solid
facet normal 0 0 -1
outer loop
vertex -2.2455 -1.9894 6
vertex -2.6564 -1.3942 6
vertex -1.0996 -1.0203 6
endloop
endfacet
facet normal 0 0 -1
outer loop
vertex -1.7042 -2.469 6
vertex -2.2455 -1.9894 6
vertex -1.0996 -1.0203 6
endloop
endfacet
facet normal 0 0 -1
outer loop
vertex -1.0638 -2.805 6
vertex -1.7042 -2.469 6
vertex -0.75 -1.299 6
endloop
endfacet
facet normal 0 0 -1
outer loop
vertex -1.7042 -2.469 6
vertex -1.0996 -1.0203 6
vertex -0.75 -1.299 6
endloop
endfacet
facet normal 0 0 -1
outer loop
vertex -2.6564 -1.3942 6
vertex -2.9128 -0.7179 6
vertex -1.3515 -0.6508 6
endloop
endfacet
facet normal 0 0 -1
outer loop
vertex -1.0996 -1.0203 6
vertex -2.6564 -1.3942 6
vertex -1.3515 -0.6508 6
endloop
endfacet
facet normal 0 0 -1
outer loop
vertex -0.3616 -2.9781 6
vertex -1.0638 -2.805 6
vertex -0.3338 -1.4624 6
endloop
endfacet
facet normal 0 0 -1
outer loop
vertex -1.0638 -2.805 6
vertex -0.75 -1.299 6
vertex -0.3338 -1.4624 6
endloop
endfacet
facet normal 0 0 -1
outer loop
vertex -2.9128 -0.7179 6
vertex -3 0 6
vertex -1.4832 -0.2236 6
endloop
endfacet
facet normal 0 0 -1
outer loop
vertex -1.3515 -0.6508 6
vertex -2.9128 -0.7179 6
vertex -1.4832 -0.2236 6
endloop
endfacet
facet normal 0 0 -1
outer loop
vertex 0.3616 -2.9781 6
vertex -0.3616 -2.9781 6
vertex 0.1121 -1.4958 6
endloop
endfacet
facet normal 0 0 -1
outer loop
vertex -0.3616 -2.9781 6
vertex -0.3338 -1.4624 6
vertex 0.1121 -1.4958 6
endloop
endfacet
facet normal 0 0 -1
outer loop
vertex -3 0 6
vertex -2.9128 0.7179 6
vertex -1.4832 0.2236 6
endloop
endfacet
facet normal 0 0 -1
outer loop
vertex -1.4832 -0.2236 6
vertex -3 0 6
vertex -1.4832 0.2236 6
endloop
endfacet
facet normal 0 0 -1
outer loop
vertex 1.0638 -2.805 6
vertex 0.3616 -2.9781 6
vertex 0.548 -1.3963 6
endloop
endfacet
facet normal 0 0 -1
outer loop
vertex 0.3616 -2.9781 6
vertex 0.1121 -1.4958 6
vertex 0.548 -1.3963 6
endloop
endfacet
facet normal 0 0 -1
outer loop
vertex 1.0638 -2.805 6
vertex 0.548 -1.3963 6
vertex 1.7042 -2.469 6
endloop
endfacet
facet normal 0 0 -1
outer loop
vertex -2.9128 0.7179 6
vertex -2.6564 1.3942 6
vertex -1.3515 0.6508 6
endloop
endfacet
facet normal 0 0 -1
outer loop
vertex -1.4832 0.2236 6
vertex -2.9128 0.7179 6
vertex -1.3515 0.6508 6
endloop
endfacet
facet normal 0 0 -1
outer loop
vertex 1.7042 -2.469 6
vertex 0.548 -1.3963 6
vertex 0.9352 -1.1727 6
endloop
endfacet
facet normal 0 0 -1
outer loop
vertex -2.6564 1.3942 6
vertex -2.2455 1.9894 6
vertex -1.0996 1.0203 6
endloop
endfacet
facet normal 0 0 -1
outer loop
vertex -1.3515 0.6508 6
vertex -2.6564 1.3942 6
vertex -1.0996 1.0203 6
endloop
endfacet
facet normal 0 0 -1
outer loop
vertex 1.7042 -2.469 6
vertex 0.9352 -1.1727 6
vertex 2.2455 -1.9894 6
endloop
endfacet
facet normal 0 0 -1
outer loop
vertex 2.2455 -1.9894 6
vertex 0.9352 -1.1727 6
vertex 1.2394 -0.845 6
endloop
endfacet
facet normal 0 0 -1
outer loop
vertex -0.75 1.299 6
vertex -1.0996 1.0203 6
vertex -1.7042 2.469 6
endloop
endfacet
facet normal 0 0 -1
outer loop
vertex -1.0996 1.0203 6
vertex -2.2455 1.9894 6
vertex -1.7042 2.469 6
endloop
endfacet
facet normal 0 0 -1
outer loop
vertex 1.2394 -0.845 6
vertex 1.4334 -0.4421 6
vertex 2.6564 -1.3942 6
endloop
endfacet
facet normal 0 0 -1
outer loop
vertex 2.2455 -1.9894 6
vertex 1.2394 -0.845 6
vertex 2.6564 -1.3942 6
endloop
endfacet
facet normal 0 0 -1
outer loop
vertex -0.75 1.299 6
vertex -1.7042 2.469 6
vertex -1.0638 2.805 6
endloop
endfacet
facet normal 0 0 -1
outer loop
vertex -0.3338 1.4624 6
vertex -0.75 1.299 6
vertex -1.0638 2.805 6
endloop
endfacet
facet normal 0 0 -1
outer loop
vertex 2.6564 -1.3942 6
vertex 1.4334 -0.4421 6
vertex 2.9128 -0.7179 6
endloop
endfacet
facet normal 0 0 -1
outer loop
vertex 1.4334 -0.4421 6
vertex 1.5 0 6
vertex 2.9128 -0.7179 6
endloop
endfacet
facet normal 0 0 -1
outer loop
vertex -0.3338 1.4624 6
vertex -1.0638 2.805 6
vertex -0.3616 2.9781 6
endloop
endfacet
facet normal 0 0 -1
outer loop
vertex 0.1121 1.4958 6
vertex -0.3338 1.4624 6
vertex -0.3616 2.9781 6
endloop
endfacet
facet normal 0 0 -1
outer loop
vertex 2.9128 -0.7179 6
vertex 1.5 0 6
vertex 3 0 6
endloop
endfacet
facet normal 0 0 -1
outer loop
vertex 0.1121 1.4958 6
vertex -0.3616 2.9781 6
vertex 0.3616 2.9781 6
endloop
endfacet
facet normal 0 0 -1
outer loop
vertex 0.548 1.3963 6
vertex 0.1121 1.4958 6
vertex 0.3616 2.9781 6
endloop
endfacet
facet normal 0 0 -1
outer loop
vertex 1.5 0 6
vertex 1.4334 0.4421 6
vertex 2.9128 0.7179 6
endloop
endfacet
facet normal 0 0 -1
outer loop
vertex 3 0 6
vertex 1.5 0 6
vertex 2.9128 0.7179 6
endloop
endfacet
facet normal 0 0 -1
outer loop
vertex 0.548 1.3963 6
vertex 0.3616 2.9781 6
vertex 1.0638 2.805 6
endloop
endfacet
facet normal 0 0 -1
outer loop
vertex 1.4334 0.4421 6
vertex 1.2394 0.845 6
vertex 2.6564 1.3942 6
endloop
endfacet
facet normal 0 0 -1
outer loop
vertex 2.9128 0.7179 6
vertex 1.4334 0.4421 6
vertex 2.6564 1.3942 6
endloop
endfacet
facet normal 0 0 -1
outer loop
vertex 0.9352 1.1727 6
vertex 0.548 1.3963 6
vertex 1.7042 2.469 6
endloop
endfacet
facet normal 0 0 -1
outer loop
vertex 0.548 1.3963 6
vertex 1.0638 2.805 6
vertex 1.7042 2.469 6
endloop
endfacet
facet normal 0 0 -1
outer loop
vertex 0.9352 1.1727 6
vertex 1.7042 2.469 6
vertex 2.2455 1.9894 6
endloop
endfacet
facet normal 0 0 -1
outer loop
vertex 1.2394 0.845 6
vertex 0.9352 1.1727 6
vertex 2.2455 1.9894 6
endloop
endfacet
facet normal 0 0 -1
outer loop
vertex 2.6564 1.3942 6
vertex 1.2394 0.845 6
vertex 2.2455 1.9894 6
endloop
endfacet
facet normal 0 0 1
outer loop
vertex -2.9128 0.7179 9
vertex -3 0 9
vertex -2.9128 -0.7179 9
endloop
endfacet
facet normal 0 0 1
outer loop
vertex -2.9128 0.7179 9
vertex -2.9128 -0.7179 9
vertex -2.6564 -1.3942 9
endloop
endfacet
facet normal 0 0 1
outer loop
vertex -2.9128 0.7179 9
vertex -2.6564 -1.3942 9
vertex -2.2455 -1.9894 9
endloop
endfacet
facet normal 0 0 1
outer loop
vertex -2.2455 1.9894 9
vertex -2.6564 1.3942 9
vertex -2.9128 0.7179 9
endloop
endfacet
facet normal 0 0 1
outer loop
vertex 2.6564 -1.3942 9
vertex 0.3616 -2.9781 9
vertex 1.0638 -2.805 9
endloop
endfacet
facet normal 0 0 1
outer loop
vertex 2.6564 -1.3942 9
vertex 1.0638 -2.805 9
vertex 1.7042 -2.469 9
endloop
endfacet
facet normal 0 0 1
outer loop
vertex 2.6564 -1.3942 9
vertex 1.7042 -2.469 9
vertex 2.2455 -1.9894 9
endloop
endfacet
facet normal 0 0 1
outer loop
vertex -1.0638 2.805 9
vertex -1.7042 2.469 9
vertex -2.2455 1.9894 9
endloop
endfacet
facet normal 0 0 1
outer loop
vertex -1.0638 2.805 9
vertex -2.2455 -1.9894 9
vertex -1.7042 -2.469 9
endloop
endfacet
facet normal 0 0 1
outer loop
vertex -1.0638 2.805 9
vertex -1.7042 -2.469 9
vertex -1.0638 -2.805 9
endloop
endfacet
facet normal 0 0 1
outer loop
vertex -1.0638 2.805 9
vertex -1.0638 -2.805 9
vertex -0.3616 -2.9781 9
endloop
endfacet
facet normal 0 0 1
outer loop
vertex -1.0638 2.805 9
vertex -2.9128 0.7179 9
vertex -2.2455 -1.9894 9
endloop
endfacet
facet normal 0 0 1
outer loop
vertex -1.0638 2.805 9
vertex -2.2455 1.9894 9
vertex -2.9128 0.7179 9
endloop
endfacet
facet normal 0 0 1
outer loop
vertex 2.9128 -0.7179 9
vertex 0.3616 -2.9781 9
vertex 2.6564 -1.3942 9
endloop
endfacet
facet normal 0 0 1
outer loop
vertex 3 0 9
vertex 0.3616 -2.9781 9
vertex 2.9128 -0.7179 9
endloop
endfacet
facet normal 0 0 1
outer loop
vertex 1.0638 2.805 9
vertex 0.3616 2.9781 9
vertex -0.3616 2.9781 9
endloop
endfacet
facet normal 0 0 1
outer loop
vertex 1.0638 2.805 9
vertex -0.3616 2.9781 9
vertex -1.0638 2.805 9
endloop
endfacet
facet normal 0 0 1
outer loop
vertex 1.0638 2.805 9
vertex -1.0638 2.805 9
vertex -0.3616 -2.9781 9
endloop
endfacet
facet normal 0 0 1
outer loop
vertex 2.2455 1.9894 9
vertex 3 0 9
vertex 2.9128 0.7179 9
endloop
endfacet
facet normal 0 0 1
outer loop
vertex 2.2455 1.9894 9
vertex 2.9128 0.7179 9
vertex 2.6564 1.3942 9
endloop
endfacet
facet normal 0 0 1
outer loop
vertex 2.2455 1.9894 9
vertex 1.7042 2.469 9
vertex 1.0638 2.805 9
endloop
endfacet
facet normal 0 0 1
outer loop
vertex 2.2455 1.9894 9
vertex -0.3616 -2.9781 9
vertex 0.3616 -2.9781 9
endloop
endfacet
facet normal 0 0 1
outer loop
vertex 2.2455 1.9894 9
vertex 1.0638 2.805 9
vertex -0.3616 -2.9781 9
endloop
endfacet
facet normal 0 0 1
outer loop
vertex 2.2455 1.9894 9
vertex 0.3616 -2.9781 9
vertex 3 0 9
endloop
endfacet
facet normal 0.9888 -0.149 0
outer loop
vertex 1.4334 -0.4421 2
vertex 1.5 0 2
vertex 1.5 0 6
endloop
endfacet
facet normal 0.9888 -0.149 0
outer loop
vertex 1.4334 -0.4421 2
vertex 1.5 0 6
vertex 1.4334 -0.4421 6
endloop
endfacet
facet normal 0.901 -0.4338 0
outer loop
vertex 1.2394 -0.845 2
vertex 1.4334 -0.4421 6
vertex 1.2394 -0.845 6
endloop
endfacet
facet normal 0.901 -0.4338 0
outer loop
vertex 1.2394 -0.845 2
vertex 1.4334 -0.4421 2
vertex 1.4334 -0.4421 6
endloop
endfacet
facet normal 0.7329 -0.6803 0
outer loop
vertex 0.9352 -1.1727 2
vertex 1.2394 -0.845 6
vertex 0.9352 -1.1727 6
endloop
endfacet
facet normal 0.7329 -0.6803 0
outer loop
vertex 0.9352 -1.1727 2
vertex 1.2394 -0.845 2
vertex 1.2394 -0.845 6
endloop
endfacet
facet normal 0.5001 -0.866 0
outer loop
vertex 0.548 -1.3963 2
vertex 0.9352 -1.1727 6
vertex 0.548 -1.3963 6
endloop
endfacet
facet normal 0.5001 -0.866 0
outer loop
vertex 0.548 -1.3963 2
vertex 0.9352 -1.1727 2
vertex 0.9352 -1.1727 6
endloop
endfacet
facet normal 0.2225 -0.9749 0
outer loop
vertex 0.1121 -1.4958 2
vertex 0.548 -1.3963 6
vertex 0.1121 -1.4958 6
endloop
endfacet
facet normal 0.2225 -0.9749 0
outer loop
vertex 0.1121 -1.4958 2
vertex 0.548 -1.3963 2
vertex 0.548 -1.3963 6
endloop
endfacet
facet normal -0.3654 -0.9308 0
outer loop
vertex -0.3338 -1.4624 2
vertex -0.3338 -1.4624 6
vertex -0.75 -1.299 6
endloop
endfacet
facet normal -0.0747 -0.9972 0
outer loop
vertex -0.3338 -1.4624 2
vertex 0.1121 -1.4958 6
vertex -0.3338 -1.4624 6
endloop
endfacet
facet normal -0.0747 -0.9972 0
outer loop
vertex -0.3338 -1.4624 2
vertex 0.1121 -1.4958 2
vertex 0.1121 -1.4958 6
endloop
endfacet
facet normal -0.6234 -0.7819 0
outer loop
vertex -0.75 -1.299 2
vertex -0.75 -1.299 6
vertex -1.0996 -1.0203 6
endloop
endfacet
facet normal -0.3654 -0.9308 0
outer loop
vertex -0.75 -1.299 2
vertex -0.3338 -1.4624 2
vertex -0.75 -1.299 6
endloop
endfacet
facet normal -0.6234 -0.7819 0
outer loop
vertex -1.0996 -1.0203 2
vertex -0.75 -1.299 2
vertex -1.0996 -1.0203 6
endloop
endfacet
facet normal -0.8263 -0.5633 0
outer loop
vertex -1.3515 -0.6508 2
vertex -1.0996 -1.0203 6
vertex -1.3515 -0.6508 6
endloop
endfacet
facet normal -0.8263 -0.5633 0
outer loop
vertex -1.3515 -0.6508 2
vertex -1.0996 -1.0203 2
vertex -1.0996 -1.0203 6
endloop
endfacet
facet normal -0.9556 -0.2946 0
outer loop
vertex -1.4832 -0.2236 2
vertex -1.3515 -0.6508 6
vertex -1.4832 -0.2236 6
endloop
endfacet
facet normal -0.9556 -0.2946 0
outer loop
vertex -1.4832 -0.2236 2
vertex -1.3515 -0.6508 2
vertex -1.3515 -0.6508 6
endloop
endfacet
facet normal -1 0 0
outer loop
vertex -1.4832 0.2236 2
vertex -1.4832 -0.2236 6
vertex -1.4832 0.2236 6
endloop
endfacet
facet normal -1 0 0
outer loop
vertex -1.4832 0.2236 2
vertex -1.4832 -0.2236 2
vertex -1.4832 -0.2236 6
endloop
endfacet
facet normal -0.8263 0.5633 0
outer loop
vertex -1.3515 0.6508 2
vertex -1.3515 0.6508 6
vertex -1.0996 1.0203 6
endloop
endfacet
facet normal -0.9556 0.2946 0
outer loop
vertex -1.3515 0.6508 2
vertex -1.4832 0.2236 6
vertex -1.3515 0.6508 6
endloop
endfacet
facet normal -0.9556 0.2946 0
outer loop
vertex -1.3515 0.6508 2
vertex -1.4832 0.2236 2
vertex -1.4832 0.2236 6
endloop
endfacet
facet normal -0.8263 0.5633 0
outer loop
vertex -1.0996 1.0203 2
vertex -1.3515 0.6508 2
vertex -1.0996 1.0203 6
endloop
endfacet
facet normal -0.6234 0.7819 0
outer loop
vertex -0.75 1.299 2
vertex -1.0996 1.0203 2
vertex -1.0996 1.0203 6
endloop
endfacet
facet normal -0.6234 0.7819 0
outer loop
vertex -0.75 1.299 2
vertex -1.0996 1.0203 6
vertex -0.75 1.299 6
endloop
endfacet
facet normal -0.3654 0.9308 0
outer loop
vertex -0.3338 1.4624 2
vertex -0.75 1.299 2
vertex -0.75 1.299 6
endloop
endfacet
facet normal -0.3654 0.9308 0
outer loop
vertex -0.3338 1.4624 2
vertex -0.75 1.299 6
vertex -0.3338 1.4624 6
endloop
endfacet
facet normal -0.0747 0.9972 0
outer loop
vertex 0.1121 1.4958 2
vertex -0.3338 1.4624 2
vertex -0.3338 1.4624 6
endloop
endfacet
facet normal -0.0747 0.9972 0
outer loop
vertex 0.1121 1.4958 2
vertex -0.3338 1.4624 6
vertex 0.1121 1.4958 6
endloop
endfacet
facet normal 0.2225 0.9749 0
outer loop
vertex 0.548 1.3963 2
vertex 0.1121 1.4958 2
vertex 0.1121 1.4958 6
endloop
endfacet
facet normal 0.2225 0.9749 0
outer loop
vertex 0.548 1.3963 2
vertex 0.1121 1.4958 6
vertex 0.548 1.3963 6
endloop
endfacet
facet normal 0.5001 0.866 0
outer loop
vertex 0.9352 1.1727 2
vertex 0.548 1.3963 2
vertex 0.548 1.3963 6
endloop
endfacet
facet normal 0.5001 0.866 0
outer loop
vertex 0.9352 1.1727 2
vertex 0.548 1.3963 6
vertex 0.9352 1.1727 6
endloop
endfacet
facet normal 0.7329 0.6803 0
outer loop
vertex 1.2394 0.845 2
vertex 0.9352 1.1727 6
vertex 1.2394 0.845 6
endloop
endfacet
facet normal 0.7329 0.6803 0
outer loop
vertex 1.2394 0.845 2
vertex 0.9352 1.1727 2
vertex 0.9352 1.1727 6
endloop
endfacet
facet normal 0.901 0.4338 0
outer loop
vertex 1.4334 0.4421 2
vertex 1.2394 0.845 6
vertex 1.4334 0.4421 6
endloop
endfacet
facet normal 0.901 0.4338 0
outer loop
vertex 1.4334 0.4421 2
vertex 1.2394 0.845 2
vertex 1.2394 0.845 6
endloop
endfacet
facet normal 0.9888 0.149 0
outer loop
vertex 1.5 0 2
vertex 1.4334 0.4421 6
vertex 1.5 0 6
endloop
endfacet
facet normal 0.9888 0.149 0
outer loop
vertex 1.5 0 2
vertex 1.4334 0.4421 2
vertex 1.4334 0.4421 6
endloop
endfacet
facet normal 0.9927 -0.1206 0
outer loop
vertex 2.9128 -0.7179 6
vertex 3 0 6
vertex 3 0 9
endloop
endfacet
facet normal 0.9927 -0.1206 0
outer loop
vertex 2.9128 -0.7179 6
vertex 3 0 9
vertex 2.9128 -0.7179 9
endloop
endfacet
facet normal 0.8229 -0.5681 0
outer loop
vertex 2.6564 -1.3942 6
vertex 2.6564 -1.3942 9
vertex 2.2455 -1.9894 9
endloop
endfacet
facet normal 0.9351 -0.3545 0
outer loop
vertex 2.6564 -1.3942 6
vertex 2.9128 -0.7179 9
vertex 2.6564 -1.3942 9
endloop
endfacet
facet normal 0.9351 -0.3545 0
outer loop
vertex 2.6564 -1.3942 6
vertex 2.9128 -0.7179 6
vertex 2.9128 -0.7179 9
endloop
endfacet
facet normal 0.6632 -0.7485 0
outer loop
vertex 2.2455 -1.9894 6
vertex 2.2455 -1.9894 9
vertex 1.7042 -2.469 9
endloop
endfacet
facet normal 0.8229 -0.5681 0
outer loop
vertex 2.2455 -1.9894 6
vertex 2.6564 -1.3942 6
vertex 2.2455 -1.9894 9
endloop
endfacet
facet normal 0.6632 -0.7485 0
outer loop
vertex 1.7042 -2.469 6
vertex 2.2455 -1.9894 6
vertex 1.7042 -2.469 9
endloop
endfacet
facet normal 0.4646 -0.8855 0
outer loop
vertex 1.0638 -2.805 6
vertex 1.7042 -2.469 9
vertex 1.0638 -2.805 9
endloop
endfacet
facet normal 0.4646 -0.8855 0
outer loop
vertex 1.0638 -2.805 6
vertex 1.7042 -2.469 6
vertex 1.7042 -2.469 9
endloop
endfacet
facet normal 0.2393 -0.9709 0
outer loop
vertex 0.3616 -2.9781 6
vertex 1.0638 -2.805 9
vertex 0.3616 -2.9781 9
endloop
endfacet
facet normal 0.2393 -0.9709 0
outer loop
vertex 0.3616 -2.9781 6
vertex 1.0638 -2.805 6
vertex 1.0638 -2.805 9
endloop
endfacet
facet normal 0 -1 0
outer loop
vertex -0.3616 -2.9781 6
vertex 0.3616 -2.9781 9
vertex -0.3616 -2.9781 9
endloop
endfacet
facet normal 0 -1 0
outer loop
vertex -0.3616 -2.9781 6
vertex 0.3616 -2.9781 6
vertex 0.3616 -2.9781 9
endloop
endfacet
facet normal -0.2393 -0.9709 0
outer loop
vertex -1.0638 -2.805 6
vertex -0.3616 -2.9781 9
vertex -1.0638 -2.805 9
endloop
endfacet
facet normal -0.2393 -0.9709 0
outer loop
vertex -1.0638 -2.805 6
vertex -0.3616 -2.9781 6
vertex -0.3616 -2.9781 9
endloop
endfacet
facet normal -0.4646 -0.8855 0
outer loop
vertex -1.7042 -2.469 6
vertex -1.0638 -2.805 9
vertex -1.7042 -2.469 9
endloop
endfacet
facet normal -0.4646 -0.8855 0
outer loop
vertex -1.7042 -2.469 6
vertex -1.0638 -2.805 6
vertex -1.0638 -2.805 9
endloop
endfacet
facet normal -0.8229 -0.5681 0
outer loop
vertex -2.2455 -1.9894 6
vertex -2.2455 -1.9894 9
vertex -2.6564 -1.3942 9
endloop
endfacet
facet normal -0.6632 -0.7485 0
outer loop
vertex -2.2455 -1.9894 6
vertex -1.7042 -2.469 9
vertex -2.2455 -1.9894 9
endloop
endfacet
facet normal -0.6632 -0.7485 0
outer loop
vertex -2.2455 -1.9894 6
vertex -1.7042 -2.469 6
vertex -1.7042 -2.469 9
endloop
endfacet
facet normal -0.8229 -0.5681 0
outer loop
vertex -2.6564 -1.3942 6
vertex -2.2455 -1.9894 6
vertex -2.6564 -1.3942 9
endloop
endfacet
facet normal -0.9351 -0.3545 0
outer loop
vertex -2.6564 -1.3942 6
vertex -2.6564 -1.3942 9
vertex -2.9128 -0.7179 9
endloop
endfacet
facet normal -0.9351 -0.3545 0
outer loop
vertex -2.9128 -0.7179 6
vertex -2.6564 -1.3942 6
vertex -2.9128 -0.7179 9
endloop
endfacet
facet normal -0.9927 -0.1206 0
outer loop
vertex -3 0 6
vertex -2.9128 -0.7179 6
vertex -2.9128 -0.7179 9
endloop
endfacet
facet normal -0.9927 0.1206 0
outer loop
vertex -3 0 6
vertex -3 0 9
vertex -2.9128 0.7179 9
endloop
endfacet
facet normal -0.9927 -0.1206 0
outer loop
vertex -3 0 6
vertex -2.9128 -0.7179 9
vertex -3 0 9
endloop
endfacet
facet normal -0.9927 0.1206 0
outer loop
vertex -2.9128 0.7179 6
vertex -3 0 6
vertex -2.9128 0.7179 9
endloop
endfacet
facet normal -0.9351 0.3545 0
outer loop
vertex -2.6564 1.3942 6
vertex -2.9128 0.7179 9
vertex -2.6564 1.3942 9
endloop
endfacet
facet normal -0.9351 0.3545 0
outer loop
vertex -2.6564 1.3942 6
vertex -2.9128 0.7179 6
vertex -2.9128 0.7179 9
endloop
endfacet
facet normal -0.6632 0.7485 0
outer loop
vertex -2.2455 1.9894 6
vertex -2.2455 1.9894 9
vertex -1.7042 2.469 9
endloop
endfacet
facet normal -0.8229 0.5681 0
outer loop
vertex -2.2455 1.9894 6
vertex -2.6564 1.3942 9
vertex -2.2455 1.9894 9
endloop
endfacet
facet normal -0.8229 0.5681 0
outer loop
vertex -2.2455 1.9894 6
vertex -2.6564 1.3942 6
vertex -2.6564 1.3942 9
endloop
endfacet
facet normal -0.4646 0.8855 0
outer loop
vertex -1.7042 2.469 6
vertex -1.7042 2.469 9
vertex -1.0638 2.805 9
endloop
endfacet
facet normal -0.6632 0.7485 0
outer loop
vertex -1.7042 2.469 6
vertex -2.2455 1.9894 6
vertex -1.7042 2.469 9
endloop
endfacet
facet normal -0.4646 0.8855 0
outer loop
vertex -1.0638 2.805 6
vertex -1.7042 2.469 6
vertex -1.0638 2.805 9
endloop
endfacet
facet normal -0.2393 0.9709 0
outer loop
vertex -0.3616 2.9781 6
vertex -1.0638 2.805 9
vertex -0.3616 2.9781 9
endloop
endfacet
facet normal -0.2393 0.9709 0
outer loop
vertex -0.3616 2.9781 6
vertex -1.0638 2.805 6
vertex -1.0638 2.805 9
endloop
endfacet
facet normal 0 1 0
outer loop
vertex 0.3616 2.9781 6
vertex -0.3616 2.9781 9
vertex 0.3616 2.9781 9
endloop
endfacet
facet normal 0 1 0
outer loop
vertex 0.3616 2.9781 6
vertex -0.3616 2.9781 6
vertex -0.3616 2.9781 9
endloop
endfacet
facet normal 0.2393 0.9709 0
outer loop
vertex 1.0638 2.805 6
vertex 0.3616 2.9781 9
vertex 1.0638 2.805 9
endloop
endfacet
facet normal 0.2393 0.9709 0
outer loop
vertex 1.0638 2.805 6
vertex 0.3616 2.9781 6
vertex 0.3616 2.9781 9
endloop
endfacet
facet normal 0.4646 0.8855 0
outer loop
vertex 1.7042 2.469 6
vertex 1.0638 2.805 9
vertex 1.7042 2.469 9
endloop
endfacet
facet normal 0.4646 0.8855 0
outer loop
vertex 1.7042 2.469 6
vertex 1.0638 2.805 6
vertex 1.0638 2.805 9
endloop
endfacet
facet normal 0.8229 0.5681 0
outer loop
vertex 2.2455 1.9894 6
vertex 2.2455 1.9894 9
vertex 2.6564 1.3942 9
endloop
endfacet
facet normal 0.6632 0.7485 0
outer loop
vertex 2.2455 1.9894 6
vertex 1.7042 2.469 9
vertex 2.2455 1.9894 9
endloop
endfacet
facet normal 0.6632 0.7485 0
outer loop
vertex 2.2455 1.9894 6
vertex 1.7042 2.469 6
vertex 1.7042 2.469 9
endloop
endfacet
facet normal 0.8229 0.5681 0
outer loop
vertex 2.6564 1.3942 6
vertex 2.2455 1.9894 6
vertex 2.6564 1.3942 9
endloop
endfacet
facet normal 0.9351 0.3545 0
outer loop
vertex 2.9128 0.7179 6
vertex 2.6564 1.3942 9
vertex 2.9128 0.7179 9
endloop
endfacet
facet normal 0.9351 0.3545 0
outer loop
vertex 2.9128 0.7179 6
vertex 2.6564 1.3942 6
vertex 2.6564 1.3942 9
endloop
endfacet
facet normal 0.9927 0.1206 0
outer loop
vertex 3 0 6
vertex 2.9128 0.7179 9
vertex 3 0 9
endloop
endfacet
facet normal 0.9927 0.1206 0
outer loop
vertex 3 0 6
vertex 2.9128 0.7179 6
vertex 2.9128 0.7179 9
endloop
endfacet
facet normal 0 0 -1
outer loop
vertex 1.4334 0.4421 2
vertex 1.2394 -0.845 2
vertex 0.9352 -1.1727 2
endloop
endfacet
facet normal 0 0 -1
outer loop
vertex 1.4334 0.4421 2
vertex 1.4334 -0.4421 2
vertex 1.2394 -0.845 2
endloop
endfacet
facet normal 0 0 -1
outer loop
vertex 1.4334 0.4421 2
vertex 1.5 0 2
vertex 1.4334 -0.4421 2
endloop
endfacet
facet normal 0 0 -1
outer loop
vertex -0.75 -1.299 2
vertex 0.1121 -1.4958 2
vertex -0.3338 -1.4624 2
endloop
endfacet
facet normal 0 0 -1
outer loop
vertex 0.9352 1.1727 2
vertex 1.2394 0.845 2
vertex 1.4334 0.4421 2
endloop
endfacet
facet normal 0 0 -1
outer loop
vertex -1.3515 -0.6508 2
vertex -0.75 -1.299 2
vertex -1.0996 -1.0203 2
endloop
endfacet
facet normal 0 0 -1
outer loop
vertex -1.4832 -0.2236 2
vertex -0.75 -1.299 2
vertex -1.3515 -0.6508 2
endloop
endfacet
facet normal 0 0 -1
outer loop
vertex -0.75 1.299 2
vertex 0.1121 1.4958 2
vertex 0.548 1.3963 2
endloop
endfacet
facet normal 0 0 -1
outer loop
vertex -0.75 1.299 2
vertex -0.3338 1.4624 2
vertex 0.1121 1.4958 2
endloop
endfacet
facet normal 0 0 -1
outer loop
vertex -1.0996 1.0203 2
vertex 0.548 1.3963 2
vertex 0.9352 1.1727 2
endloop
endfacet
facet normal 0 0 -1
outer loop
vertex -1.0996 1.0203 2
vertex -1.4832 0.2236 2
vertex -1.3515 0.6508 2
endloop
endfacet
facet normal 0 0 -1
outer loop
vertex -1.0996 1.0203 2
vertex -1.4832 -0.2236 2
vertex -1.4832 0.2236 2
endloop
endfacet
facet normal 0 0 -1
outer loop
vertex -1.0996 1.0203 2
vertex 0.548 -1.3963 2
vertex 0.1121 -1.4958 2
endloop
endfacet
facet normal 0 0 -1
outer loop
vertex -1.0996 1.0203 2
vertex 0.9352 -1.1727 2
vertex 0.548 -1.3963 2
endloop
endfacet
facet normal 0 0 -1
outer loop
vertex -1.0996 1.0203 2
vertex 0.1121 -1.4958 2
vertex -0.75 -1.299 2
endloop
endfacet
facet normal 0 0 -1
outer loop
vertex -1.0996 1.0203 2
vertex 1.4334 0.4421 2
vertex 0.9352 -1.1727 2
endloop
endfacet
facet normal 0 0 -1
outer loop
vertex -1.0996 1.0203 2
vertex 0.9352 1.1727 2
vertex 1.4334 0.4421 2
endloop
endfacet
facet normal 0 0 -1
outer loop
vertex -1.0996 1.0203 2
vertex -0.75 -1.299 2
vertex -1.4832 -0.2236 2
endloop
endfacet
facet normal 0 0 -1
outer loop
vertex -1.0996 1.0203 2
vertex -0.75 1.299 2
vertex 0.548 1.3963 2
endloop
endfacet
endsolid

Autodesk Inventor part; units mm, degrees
ref_plane "YZ Plane" through (0, 0, 0) normal (1, 0, 0) x (0, 1, 0)
ref_plane "XZ Plane" through (0, 0, 0) normal (0, 1, 0) x (-1, 0, 0)
ref_plane "XY Plane" through (0, 0, 0) normal (0, 0, 1) x (1, 0, 0)
sketch "スケッチ1" plane through (0, 0, 0) normal (0, 0, 1) x (1, 0, 0)
  circle A0 centre (0, 0) radius 1.5
  dimension "d0" = 3
extrude "押し出し1" add sketch "スケッチ1" along normal blind 6
sketch "スケッチ2" plane through (0, 0, 6) normal (0, 0, 1) x (1, 0, 0)
  circle A0 centre (0, 0) radius 1.5 projected
  circle A1 centre (0, 0) radius 3
  dimension "d3" = 6
extrude "押し出し2" add sketch "スケッチ2" along normal blind 3 contours A0 | A1
thread "ねじ1" size "M3x0.5" class "6g" standard "ANSI Metric M Profile" full length
sketch "スケッチ4" plane through (0, 0, 0) normal (0, 0, -1) x (-1, 0, 0)
  circle A0 centre (0, 0) radius 1.5 projected
extrude "押し出し4" cut sketch "スケッチ4" against normal blind 1.25
sketch "スケッチ5" plane through (0, 0, 1.25) normal (0, 0, -1) x (-1, 0, 0)
  circle A0 centre (0, 0) radius 1.5 projected
extrude "押し出し5" cut sketch "スケッチ5" against normal blind 0.75
properties part number "SB　4mm ボルト" material "Steel, Mild"
